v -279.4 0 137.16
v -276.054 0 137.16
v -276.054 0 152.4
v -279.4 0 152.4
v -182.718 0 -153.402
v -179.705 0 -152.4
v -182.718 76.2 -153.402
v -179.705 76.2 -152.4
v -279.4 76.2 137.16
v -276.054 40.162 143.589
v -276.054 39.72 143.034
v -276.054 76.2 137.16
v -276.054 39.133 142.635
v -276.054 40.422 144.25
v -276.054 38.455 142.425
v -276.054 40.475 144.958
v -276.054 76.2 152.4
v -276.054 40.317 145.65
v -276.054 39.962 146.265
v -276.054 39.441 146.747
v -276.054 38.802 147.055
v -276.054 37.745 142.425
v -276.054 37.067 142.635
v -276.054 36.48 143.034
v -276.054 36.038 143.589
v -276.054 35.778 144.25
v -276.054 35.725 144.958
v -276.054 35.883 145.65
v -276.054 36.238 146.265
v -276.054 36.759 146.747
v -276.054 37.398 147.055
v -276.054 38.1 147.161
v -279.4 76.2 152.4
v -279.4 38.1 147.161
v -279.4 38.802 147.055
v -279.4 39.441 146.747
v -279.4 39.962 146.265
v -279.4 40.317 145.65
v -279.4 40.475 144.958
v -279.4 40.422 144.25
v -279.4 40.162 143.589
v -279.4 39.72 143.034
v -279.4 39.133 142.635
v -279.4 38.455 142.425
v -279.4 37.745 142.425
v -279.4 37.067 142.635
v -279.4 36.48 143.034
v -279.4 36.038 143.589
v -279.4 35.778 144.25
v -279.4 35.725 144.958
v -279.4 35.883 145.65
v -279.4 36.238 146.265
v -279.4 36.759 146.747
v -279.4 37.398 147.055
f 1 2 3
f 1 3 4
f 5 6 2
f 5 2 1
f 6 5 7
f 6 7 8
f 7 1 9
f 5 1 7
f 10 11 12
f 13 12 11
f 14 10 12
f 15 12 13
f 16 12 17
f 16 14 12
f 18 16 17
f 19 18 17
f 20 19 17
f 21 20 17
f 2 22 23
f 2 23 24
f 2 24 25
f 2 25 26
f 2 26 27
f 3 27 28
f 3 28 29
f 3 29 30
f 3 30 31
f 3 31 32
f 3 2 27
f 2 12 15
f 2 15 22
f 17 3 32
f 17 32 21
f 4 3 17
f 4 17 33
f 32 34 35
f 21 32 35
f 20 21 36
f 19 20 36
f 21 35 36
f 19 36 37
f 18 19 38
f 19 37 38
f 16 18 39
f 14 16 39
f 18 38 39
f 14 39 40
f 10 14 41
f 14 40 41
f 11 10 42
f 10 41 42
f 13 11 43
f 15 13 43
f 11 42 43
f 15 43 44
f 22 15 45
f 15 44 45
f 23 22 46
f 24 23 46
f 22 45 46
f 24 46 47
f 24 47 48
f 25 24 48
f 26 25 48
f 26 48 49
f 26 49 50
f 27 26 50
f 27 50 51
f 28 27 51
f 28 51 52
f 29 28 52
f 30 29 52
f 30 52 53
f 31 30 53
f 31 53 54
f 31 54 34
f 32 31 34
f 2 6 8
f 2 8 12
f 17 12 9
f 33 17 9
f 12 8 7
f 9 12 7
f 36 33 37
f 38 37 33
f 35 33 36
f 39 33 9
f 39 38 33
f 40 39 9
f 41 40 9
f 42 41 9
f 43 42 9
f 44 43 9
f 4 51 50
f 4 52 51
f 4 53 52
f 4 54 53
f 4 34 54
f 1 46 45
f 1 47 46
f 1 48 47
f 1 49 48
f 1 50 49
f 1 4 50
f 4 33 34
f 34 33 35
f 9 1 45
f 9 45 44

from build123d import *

# Parameters (mm, degrees)
BOSS_EXTRUDE1_DEPTH     = 76.2
SKETCH2_R               = 2.38125
CUT_EXTRUDE1_DEPTH      = 1
CUT_EXTRUDE1_DEPTH_BACK = 100.695


with BuildPart() as part:
    # Sketch1 → Boss-Extrude1 (new body)
    with BuildSketch(Plane(origin=(0, 0, 0), x_dir=(1, 0, 0), z_dir=(0, 1, 0))):
        Polygon((-279.4, -137.16), (-182.717603245, 153.402420415), (-179.705, 152.4), (-276.05384912, -137.16), (-276.05384912, -152.4), (-279.4, -152.4), align=None)
    extrude(amount=BOSS_EXTRUDE1_DEPTH)

    # Sketch2 → Cut-Extrude1 (cut, two sides)
    with BuildSketch(Plane.ZY.offset(279.4)) as cut_extrude1_sk:
        with Locations((144.78, 38.1)):
            Circle(SKETCH2_R)
    extrude(amount=CUT_EXTRUDE1_DEPTH, mode=Mode.SUBTRACT)
    extrude(cut_extrude1_sk.sketch, amount=-CUT_EXTRUDE1_DEPTH_BACK, mode=Mode.SUBTRACT)


solid = part.part
